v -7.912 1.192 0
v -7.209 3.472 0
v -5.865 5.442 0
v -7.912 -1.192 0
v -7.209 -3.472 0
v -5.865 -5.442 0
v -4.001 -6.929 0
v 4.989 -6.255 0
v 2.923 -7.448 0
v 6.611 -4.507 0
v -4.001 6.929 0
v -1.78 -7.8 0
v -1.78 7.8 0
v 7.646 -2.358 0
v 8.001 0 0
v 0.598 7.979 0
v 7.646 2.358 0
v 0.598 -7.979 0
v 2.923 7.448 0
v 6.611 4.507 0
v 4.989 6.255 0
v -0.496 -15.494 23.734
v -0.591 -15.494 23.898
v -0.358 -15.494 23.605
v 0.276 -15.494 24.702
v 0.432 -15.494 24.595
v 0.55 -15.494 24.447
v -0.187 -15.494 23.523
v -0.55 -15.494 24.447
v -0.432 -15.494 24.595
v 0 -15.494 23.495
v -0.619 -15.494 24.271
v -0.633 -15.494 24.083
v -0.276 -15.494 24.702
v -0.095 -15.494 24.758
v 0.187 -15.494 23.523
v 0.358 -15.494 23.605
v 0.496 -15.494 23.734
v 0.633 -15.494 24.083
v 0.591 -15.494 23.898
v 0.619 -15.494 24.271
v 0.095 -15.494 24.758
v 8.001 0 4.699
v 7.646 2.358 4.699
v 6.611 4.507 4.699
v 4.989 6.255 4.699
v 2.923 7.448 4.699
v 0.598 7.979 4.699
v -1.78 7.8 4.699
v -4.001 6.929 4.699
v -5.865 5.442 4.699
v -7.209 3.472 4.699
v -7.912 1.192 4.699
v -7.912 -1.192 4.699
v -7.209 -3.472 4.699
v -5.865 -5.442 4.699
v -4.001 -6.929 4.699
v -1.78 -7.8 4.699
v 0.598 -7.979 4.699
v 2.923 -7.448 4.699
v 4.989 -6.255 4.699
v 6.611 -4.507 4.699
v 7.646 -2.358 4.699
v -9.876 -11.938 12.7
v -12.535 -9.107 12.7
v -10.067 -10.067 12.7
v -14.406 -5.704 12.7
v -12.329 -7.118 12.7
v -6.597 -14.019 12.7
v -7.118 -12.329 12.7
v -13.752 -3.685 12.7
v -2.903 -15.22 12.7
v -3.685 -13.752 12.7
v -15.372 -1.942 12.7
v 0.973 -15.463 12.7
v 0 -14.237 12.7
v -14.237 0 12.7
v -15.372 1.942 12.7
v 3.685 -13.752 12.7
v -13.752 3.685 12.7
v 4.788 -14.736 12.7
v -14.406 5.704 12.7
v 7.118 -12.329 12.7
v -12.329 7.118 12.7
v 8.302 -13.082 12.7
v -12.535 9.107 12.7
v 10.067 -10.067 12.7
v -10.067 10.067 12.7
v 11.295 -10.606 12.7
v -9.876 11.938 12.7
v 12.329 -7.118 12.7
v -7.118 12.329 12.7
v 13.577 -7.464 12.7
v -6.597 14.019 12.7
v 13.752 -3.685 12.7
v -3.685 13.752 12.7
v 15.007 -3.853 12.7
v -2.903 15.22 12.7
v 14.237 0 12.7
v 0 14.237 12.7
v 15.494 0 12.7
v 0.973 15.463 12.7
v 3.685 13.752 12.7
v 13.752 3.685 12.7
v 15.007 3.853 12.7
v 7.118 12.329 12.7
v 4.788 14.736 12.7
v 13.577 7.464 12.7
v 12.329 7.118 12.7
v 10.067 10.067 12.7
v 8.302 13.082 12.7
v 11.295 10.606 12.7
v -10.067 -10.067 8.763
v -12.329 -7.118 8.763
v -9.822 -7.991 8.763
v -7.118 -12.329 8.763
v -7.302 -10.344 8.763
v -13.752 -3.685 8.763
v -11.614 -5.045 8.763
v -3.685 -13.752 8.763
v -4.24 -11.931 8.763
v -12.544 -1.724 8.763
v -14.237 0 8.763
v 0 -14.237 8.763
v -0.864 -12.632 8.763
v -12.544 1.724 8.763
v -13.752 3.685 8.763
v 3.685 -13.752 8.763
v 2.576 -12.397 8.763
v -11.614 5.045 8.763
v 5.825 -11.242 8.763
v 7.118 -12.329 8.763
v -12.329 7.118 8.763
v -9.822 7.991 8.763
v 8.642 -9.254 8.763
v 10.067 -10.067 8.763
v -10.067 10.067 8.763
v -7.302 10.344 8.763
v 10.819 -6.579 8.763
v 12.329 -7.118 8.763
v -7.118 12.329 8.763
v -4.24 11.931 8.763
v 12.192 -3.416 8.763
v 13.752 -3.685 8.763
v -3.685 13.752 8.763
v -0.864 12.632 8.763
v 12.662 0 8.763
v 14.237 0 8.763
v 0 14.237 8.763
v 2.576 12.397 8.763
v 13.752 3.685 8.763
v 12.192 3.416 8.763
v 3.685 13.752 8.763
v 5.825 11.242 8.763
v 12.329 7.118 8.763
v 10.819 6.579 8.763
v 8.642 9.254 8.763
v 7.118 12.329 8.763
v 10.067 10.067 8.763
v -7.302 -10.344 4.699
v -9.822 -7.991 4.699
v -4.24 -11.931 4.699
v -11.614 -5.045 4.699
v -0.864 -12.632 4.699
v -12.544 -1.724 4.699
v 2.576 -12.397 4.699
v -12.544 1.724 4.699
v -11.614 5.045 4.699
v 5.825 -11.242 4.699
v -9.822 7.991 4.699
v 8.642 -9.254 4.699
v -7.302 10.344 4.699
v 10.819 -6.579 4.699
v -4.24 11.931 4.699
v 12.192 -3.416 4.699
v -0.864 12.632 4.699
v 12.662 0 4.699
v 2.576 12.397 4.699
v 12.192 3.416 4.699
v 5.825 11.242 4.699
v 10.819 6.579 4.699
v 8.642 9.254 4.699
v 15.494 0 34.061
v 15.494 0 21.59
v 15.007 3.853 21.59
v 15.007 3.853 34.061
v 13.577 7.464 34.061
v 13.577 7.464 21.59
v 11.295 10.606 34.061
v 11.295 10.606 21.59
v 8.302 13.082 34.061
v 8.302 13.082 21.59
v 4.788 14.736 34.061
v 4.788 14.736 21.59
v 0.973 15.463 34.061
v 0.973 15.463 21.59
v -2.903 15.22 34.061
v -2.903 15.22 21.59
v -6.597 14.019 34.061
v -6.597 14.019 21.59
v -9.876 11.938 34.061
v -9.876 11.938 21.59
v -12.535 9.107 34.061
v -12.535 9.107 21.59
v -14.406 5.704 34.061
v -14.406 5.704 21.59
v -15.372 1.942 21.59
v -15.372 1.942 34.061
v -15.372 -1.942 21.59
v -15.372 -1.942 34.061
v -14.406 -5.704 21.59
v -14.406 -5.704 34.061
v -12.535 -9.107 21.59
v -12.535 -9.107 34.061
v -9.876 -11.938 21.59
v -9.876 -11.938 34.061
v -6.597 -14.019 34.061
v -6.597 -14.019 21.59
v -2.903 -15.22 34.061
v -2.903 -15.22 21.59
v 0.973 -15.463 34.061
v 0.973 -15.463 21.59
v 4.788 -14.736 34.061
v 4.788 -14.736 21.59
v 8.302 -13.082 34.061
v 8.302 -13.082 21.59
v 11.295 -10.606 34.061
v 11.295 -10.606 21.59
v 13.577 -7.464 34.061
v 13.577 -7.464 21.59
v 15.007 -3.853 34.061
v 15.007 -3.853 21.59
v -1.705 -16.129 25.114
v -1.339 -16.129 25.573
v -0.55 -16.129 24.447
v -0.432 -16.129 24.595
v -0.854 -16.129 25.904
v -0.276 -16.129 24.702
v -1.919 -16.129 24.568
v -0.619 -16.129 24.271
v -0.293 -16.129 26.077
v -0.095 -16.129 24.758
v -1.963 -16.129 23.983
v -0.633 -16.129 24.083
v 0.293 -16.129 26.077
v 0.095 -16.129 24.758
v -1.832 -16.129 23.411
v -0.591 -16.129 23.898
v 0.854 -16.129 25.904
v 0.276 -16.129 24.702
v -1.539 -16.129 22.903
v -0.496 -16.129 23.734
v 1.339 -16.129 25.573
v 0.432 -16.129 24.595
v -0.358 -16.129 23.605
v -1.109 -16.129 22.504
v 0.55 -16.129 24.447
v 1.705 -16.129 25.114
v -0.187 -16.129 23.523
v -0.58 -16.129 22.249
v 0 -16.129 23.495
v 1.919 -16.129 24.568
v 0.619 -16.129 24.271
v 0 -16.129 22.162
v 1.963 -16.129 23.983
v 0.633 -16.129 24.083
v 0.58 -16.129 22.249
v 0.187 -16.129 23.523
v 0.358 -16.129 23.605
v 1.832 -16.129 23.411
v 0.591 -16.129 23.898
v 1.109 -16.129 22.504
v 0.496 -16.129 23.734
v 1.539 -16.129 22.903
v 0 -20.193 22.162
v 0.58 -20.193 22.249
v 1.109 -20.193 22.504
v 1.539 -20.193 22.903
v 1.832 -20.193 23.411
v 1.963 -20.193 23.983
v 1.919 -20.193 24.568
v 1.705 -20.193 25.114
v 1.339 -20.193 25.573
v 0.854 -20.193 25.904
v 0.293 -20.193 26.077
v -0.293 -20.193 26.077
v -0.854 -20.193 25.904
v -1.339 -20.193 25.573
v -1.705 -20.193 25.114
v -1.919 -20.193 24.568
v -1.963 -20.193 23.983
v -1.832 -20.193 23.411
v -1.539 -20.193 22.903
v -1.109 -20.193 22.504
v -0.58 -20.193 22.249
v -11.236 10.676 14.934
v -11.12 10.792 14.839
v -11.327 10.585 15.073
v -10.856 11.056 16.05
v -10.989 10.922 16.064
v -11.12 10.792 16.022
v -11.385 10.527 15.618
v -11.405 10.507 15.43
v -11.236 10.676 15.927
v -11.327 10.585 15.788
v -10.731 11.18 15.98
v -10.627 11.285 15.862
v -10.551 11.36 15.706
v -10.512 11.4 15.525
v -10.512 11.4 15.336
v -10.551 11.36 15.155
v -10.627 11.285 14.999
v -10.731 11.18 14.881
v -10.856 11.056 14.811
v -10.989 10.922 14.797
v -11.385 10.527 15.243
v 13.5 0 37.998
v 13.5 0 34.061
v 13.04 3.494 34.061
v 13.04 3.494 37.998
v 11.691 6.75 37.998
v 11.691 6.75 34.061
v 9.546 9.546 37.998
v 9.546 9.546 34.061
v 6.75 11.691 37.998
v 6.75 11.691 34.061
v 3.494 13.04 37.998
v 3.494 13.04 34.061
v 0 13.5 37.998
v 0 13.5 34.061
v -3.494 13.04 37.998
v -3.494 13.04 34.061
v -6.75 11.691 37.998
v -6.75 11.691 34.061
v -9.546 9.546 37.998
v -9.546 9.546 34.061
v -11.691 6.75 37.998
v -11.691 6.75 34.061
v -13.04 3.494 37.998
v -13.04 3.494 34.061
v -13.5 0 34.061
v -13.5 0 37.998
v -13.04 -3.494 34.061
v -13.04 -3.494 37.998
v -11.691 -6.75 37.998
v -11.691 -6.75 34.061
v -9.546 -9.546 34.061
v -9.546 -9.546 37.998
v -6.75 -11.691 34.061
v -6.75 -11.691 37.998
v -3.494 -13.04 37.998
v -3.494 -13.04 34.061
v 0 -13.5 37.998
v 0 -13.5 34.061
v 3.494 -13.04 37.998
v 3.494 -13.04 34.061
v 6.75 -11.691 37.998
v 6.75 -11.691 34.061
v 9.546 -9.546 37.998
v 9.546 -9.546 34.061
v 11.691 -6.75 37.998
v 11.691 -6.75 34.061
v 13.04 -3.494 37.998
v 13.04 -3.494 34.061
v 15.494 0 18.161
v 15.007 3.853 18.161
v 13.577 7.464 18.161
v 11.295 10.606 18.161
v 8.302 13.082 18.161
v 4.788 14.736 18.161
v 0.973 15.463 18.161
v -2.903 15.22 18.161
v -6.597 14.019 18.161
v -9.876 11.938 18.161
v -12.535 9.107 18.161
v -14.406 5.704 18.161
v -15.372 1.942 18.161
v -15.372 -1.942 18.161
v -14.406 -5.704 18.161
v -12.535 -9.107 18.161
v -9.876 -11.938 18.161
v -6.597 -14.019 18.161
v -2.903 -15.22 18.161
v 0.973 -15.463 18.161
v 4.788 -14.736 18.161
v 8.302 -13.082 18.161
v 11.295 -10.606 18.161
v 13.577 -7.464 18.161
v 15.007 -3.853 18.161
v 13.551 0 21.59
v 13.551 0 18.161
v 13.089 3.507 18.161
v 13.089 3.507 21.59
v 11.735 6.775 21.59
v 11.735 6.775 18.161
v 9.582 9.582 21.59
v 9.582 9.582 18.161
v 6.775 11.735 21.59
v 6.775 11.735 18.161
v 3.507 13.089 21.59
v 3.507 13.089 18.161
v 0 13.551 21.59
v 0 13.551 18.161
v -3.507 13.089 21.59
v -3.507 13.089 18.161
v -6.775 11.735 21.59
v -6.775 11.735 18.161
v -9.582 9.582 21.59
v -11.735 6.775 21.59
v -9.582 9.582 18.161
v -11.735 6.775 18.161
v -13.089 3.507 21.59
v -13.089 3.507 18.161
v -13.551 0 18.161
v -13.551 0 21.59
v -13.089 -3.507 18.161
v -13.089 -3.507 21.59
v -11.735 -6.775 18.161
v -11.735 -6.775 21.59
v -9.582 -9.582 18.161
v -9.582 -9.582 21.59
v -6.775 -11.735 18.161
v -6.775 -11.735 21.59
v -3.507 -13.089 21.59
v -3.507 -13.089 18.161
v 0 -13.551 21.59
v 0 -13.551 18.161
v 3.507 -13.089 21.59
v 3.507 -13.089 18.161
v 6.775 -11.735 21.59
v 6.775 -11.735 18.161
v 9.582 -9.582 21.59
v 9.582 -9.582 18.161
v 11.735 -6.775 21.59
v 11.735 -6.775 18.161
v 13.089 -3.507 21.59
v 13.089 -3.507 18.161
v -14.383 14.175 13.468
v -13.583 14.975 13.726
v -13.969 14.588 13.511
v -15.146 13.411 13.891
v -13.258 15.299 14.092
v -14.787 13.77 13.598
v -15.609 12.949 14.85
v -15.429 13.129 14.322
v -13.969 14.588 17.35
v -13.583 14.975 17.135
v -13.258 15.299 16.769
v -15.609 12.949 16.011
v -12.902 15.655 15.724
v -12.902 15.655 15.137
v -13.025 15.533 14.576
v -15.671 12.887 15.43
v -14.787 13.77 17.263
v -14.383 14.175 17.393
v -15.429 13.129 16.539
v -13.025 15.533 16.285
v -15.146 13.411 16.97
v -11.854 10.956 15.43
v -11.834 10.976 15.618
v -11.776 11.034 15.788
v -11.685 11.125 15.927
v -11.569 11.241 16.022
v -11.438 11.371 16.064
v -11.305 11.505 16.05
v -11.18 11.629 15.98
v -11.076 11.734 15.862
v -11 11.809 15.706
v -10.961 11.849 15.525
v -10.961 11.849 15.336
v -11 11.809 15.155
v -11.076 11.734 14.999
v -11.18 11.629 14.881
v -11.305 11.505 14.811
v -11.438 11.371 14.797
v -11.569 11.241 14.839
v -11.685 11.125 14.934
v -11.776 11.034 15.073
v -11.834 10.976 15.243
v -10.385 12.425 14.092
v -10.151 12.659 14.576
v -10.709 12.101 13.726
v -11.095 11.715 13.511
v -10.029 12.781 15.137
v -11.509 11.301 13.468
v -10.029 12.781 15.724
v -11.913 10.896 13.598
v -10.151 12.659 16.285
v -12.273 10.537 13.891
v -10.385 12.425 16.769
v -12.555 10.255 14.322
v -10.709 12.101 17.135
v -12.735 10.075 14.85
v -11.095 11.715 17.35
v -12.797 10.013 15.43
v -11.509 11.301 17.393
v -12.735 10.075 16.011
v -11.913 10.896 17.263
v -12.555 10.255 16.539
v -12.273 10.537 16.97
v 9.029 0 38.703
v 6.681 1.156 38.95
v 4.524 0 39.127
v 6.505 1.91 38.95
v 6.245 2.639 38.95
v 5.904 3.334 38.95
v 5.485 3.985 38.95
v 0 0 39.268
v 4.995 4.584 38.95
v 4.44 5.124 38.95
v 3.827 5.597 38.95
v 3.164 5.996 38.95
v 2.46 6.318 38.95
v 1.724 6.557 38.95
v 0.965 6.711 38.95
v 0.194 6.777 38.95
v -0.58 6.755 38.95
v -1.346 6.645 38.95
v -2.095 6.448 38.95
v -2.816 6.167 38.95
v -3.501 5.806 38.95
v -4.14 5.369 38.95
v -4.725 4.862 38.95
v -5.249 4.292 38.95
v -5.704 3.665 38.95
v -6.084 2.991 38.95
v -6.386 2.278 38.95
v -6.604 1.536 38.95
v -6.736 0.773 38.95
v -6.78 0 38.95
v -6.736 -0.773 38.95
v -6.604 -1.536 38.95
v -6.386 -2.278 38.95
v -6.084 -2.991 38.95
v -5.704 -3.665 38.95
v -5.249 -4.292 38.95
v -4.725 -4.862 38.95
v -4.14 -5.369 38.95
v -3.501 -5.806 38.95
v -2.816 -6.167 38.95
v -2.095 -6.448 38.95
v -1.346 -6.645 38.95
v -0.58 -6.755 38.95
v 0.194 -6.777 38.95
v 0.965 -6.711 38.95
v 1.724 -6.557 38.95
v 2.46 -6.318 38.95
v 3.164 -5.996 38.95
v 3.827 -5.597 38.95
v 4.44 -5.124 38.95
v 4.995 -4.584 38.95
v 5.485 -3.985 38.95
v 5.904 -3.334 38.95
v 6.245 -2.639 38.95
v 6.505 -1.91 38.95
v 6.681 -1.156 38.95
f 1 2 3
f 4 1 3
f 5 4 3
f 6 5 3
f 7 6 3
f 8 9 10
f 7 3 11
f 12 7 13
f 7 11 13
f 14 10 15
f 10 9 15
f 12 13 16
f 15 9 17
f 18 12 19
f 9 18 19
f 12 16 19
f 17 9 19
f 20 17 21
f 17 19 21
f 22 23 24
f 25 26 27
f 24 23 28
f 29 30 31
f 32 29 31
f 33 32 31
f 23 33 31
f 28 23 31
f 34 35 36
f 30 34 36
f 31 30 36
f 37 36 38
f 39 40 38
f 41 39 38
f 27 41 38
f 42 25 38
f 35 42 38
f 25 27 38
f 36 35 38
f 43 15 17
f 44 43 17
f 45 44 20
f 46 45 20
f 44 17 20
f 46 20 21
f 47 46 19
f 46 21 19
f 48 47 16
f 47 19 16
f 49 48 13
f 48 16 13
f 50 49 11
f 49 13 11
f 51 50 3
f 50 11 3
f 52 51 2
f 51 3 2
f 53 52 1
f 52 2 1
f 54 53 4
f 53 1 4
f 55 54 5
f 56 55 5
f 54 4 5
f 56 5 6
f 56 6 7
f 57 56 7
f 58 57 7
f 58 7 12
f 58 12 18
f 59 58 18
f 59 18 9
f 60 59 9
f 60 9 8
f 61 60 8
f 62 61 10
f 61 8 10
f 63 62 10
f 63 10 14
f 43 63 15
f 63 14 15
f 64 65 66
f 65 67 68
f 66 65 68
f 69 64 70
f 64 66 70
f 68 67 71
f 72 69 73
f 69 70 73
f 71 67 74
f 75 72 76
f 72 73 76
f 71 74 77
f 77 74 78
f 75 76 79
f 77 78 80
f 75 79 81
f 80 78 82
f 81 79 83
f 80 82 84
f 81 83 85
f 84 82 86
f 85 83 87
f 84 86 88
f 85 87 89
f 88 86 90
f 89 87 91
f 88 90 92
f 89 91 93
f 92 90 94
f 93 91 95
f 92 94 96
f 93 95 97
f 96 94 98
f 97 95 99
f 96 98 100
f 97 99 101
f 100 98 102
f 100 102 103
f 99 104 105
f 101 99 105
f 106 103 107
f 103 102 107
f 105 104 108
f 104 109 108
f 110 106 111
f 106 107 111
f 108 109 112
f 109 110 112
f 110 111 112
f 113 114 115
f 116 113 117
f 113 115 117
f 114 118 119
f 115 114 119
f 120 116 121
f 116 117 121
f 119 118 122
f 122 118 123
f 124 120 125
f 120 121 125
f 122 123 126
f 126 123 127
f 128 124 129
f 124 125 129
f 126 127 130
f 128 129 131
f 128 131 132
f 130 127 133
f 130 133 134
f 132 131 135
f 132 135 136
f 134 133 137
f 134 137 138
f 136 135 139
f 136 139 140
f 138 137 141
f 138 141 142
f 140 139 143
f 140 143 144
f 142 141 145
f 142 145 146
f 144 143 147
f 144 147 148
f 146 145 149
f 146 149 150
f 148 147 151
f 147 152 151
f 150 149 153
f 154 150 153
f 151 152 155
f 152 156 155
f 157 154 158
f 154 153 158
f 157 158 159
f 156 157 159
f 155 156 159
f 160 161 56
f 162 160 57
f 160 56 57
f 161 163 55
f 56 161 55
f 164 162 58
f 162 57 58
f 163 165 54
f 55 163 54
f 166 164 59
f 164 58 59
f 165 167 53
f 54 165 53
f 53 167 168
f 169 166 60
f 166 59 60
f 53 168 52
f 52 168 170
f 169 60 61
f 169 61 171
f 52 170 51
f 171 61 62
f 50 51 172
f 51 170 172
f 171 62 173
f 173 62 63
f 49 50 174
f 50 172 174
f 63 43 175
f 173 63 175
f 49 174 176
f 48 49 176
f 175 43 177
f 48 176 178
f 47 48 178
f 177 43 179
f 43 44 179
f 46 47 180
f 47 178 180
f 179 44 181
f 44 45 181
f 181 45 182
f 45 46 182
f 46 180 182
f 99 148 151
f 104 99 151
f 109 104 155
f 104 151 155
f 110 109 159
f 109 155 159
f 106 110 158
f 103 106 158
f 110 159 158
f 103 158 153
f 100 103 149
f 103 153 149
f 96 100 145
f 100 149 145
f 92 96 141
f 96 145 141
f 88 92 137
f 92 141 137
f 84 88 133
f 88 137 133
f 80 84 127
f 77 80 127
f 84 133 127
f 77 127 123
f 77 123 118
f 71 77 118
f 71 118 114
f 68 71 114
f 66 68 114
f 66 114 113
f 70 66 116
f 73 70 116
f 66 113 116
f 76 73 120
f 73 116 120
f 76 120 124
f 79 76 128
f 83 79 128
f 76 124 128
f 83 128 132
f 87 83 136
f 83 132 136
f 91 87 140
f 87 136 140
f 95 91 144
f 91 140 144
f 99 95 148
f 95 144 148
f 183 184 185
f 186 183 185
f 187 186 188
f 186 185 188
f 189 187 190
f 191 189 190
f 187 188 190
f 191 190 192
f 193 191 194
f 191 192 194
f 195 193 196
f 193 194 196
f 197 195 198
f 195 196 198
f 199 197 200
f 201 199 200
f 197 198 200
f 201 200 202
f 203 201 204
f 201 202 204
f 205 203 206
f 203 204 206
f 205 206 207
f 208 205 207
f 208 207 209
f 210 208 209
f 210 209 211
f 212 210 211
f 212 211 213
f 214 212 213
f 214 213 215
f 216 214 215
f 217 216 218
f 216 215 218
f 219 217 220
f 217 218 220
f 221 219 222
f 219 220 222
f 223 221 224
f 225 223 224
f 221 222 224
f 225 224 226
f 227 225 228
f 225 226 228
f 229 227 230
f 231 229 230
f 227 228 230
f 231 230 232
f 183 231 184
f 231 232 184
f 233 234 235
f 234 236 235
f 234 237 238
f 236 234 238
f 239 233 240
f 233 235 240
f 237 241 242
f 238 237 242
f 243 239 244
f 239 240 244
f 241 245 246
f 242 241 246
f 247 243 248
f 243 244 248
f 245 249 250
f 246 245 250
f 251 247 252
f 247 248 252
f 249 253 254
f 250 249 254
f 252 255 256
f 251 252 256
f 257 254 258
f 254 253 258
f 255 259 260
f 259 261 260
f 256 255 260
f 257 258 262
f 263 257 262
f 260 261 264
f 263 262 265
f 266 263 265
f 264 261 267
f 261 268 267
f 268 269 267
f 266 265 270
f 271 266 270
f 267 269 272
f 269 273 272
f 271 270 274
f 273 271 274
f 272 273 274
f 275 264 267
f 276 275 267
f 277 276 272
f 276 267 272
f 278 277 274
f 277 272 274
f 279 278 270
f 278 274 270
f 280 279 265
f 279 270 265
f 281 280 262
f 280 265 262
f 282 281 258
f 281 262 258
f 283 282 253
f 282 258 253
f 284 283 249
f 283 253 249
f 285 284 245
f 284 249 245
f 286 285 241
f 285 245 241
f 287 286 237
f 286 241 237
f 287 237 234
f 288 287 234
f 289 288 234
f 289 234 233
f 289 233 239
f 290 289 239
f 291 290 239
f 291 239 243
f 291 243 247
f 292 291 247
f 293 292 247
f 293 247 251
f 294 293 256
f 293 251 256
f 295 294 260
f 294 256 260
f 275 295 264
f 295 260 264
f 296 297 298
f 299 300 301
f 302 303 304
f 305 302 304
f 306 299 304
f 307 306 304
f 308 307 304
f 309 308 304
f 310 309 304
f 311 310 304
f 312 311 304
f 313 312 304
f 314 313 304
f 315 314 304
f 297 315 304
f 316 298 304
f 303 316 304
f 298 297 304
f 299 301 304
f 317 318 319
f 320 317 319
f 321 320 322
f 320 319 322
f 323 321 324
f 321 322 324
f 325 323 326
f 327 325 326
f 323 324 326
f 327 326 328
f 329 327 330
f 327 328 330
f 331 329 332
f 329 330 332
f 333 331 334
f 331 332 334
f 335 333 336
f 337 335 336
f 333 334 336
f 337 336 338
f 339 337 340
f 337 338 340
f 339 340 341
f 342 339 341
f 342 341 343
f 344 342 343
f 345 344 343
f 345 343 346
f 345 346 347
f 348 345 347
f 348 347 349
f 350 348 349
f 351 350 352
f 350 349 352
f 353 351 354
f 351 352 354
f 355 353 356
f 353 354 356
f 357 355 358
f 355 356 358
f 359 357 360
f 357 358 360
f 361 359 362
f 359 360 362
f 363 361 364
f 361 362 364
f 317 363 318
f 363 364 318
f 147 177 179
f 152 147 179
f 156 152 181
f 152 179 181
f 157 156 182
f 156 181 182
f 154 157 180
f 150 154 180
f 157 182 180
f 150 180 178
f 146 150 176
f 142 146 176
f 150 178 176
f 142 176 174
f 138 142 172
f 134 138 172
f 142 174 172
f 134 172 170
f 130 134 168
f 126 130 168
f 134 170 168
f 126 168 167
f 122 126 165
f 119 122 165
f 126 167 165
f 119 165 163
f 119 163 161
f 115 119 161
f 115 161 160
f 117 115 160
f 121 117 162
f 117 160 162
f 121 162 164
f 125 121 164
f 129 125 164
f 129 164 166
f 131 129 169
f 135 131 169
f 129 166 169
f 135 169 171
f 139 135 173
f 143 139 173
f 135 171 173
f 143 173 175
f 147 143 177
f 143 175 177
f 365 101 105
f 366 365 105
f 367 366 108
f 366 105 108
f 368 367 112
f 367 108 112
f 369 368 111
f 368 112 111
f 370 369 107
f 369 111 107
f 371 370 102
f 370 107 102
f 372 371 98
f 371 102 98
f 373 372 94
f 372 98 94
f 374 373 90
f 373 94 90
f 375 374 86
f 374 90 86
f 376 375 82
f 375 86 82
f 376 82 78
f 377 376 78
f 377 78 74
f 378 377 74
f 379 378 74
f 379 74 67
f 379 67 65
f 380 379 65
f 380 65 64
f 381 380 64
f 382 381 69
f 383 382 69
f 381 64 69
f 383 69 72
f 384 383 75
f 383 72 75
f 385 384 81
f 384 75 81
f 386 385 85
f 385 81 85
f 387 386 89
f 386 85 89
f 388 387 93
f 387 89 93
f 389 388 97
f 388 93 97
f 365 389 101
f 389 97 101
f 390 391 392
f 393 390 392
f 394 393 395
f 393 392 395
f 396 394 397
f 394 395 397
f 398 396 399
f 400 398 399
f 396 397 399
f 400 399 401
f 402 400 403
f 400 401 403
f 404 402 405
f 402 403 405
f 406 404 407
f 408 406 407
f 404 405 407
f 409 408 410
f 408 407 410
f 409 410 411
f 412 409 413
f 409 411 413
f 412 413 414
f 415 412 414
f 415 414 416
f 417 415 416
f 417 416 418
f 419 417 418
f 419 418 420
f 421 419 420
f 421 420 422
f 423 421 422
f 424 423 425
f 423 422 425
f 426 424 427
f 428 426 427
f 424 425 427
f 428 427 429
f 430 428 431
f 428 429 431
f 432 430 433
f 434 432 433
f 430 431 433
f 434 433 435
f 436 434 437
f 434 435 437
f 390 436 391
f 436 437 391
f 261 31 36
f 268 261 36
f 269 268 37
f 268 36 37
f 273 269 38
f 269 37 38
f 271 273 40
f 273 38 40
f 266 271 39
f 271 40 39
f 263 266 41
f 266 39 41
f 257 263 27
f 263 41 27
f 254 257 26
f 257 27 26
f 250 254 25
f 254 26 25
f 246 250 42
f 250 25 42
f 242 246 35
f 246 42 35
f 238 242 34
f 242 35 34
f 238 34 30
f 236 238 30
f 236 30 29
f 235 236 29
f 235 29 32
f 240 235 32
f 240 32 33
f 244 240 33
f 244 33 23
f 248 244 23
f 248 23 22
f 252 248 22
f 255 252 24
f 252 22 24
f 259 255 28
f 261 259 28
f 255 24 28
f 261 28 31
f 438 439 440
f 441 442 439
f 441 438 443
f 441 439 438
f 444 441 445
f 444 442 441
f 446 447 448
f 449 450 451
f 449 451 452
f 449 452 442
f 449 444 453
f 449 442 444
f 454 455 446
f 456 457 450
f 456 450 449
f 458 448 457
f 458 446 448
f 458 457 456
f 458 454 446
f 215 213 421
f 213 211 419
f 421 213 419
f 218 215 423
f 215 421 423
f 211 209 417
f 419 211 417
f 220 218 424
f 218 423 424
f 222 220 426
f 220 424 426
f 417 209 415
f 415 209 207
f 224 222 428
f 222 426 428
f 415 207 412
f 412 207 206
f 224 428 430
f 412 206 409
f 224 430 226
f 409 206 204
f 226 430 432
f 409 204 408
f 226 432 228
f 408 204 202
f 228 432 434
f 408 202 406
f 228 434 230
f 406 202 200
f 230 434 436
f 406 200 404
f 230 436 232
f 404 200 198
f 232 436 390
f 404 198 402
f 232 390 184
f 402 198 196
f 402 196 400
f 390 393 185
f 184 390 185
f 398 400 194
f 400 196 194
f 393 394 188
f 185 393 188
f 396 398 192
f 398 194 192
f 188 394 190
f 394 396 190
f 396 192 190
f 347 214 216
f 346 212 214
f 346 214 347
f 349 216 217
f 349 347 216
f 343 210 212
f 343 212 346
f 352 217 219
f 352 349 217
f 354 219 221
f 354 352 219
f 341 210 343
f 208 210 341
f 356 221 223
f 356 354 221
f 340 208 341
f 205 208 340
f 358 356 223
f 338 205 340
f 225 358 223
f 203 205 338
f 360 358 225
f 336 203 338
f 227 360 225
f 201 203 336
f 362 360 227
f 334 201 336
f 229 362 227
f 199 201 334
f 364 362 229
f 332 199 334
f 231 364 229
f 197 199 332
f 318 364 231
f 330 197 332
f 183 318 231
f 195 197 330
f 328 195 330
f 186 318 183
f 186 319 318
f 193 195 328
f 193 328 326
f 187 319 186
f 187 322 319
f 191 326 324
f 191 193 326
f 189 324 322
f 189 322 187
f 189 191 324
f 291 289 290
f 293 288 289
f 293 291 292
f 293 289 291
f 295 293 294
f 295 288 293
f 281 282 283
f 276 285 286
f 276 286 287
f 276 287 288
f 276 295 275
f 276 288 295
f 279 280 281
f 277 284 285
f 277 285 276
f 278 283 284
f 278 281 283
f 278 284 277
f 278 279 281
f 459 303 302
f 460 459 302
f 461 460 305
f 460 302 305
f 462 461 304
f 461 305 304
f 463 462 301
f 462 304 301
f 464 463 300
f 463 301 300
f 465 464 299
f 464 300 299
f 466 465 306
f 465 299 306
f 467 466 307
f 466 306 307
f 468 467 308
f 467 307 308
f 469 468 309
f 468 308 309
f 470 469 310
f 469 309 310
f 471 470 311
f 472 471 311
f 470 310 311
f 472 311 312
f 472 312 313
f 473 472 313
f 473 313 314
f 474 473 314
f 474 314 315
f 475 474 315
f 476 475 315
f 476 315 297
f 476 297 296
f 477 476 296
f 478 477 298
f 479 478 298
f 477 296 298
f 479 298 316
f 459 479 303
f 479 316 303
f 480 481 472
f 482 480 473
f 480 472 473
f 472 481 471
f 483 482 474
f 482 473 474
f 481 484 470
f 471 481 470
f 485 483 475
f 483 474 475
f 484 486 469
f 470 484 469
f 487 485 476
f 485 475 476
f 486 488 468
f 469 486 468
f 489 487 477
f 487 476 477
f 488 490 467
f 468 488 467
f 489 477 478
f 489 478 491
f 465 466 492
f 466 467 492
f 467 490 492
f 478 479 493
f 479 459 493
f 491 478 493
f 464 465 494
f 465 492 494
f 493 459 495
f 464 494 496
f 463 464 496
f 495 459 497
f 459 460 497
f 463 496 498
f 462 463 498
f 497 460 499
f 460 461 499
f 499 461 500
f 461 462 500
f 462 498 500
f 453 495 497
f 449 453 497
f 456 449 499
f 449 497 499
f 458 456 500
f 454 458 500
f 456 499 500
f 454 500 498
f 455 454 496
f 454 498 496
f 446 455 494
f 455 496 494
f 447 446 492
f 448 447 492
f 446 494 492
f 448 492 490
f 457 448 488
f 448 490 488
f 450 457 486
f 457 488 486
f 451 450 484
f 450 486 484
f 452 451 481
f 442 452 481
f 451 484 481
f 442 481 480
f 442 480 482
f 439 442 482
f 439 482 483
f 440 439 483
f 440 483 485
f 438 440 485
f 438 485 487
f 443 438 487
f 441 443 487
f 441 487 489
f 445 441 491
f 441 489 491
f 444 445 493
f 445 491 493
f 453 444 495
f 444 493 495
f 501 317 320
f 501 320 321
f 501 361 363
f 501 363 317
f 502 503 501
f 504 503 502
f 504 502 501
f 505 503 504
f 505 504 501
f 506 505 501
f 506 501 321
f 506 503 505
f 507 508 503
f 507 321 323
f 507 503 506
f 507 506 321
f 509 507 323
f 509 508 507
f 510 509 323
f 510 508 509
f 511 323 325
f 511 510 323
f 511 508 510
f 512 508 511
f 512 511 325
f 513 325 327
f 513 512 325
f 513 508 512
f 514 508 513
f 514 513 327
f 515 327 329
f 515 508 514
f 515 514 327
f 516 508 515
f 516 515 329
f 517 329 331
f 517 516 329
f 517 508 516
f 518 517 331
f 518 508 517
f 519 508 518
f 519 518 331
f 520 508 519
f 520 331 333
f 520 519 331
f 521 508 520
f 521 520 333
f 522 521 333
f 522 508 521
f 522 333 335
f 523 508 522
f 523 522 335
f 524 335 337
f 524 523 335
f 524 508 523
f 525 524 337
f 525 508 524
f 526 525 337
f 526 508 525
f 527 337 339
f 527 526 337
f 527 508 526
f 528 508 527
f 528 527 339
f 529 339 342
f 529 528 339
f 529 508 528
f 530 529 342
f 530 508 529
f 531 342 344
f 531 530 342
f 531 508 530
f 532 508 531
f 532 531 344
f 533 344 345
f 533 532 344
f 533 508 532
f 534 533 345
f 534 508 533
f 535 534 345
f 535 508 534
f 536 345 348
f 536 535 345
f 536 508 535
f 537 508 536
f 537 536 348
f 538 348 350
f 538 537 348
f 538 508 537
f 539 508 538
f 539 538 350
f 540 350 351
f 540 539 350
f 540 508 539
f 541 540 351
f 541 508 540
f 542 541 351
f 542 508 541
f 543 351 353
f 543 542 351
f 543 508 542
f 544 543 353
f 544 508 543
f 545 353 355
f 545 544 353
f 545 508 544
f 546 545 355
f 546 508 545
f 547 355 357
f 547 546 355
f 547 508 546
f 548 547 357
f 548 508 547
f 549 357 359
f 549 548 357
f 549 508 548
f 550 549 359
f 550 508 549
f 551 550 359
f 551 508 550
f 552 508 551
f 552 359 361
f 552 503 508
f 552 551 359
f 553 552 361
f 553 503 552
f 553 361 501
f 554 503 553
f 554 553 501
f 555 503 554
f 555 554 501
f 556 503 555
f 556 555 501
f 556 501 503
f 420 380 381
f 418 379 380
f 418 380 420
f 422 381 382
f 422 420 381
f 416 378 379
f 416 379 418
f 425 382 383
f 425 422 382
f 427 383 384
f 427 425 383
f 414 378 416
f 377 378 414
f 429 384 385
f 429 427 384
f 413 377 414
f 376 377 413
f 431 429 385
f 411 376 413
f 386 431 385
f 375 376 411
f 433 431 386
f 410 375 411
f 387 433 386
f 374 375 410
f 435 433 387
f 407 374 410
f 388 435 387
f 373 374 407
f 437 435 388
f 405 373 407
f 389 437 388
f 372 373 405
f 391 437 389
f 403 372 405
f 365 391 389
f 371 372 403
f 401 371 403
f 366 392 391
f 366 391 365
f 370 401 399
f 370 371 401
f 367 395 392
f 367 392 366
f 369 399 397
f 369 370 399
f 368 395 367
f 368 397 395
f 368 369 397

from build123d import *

# Parameters (mm, degrees)
SKETCH1_R            = 8.001
BOSS_EXTRUDE1_DEPTH  = 4.699
SKETCH2_R            = 12.6619
BOSS_EXTRUDE2_DEPTH  = 4.064
SKETCH3_R            = 14.2367
BOSS_EXTRUDE3_DEPTH  = 3.937
SKETCH4_R            = 15.494
BOSS_EXTRUDE4_DEPTH  = 5.461
SKETCH5_R            = 13.5509
BOSS_EXTRUDE5_DEPTH  = 3.429
SKETCH6_R            = 15.494
BOSS_EXTRUDE6_DEPTH  = 12.4714
SKETCH7_R            = 13.5001
BOSS_EXTRUDE7_DEPTH  = 3.937
SKETCH8_R            = 0.635
BOSS_EXTRUDE8_DEPTH  = 0.635
SKETCH9_R            = 1.9685
BOSS_EXTRUDE9_DEPTH  = 4.064
SKETCH10_R           = 0.635
BOSS_EXTRUDE10_DEPTH = 0.635
SKETCH12_R           = 1.9685
BOSS_EXTRUDE11_DEPTH = 4.064


# Read off the part's stored shape, not the designer's step: Dome1
with BuildPart() as part:
    # Sketch1 → Boss-Extrude1 (new body)
    with BuildSketch(Plane.XY):
        Circle(SKETCH1_R)
    extrude(amount=BOSS_EXTRUDE1_DEPTH)

    # Sketch2 → Boss-Extrude2 (add)
    with BuildSketch(Plane.XY.offset(4.699)):
        Circle(SKETCH2_R)
    extrude(amount=BOSS_EXTRUDE2_DEPTH)

    # Sketch3 → Boss-Extrude3 (add)
    with BuildSketch(Plane.XY.offset(8.763)):
        Circle(SKETCH3_R)
    extrude(amount=BOSS_EXTRUDE3_DEPTH)

    # Sketch4 → Boss-Extrude4 (add)
    with BuildSketch(Plane.XY.offset(12.7)):
        Circle(SKETCH4_R)
    extrude(amount=BOSS_EXTRUDE4_DEPTH)

    # Sketch5 → Boss-Extrude5 (add)
    with BuildSketch(Plane.XY.offset(18.161)):
        Circle(SKETCH5_R)
    extrude(amount=BOSS_EXTRUDE5_DEPTH)

    # Sketch6 → Boss-Extrude6 (add)
    with BuildSketch(Plane.XY.offset(21.59)):
        Circle(SKETCH6_R)
    extrude(amount=BOSS_EXTRUDE6_DEPTH)

    # Sketch7 → Boss-Extrude7 (add)
    with BuildSketch(Plane.XY.offset(34.0614)):
        Circle(SKETCH7_R)
    extrude(amount=BOSS_EXTRUDE7_DEPTH)

    # Dome1 outline → Dome1 (revolve)
    with BuildSketch(Plane.XZ):
        with BuildLine():
            Line((0, 37.9984), (13.500100071, 37.998399986))
            ThreePointArc((13.500100071, 37.998399986), (6.779852542, 38.950200635), (0, 39.2684))
            Line((0, 39.2684), (0, 37.9984))
        make_face()
    revolve(axis=Axis((0, 0, 0), (0, 0, 1)))


with BuildPart() as body_2:
    # Sketch8 → Boss-Extrude8 (new body)
    with BuildSketch(Plane(origin=(0, -15.494, 0), x_dir=(-1, 0, 0), z_dir=(0, -1, 0))):
        with Locations(Location((0, -24.13, 0), (0, 0, 90))):
            Circle(SKETCH8_R)
    extrude(amount=BOSS_EXTRUDE8_DEPTH)

    # Sketch9 → Boss-Extrude9 (add)
    with BuildSketch(Plane.XZ.offset(16.129)):
        with Locations(Location((0, 24.13, 0), (0, 0, 270))):
            Circle(SKETCH9_R)
    extrude(amount=BOSS_EXTRUDE9_DEPTH)


with BuildPart() as body_3:
    # Sketch10 → Boss-Extrude10 (new body)
    with BuildSketch(Plane(origin=(-10.955912468, 10.955912468, 0), x_dir=(0.7071067811865512, 0.7071067811865438, 0), z_dir=(-0.7071067811865438, 0.7071067811865512, 0))):
        with Locations(Location((0, -15.4305, 0), (0, 0, 180))):
            Circle(SKETCH10_R)
    extrude(amount=BOSS_EXTRUDE10_DEPTH)

    # Sketch12 → Boss-Extrude11 (add)
    with BuildSketch(Plane(origin=(-11.404925274, 11.404925274, 0), x_dir=(0, 0, 1), z_dir=(-0.7071067811865438, 0.7071067811865513, 0))):
        with Locations(Location((15.4305, 0, 0), (0, 0, 270))):
            Circle(SKETCH12_R)
    extrude(amount=BOSS_EXTRUDE11_DEPTH)


solid = Compound([part.part, body_2.part, body_3.part])
